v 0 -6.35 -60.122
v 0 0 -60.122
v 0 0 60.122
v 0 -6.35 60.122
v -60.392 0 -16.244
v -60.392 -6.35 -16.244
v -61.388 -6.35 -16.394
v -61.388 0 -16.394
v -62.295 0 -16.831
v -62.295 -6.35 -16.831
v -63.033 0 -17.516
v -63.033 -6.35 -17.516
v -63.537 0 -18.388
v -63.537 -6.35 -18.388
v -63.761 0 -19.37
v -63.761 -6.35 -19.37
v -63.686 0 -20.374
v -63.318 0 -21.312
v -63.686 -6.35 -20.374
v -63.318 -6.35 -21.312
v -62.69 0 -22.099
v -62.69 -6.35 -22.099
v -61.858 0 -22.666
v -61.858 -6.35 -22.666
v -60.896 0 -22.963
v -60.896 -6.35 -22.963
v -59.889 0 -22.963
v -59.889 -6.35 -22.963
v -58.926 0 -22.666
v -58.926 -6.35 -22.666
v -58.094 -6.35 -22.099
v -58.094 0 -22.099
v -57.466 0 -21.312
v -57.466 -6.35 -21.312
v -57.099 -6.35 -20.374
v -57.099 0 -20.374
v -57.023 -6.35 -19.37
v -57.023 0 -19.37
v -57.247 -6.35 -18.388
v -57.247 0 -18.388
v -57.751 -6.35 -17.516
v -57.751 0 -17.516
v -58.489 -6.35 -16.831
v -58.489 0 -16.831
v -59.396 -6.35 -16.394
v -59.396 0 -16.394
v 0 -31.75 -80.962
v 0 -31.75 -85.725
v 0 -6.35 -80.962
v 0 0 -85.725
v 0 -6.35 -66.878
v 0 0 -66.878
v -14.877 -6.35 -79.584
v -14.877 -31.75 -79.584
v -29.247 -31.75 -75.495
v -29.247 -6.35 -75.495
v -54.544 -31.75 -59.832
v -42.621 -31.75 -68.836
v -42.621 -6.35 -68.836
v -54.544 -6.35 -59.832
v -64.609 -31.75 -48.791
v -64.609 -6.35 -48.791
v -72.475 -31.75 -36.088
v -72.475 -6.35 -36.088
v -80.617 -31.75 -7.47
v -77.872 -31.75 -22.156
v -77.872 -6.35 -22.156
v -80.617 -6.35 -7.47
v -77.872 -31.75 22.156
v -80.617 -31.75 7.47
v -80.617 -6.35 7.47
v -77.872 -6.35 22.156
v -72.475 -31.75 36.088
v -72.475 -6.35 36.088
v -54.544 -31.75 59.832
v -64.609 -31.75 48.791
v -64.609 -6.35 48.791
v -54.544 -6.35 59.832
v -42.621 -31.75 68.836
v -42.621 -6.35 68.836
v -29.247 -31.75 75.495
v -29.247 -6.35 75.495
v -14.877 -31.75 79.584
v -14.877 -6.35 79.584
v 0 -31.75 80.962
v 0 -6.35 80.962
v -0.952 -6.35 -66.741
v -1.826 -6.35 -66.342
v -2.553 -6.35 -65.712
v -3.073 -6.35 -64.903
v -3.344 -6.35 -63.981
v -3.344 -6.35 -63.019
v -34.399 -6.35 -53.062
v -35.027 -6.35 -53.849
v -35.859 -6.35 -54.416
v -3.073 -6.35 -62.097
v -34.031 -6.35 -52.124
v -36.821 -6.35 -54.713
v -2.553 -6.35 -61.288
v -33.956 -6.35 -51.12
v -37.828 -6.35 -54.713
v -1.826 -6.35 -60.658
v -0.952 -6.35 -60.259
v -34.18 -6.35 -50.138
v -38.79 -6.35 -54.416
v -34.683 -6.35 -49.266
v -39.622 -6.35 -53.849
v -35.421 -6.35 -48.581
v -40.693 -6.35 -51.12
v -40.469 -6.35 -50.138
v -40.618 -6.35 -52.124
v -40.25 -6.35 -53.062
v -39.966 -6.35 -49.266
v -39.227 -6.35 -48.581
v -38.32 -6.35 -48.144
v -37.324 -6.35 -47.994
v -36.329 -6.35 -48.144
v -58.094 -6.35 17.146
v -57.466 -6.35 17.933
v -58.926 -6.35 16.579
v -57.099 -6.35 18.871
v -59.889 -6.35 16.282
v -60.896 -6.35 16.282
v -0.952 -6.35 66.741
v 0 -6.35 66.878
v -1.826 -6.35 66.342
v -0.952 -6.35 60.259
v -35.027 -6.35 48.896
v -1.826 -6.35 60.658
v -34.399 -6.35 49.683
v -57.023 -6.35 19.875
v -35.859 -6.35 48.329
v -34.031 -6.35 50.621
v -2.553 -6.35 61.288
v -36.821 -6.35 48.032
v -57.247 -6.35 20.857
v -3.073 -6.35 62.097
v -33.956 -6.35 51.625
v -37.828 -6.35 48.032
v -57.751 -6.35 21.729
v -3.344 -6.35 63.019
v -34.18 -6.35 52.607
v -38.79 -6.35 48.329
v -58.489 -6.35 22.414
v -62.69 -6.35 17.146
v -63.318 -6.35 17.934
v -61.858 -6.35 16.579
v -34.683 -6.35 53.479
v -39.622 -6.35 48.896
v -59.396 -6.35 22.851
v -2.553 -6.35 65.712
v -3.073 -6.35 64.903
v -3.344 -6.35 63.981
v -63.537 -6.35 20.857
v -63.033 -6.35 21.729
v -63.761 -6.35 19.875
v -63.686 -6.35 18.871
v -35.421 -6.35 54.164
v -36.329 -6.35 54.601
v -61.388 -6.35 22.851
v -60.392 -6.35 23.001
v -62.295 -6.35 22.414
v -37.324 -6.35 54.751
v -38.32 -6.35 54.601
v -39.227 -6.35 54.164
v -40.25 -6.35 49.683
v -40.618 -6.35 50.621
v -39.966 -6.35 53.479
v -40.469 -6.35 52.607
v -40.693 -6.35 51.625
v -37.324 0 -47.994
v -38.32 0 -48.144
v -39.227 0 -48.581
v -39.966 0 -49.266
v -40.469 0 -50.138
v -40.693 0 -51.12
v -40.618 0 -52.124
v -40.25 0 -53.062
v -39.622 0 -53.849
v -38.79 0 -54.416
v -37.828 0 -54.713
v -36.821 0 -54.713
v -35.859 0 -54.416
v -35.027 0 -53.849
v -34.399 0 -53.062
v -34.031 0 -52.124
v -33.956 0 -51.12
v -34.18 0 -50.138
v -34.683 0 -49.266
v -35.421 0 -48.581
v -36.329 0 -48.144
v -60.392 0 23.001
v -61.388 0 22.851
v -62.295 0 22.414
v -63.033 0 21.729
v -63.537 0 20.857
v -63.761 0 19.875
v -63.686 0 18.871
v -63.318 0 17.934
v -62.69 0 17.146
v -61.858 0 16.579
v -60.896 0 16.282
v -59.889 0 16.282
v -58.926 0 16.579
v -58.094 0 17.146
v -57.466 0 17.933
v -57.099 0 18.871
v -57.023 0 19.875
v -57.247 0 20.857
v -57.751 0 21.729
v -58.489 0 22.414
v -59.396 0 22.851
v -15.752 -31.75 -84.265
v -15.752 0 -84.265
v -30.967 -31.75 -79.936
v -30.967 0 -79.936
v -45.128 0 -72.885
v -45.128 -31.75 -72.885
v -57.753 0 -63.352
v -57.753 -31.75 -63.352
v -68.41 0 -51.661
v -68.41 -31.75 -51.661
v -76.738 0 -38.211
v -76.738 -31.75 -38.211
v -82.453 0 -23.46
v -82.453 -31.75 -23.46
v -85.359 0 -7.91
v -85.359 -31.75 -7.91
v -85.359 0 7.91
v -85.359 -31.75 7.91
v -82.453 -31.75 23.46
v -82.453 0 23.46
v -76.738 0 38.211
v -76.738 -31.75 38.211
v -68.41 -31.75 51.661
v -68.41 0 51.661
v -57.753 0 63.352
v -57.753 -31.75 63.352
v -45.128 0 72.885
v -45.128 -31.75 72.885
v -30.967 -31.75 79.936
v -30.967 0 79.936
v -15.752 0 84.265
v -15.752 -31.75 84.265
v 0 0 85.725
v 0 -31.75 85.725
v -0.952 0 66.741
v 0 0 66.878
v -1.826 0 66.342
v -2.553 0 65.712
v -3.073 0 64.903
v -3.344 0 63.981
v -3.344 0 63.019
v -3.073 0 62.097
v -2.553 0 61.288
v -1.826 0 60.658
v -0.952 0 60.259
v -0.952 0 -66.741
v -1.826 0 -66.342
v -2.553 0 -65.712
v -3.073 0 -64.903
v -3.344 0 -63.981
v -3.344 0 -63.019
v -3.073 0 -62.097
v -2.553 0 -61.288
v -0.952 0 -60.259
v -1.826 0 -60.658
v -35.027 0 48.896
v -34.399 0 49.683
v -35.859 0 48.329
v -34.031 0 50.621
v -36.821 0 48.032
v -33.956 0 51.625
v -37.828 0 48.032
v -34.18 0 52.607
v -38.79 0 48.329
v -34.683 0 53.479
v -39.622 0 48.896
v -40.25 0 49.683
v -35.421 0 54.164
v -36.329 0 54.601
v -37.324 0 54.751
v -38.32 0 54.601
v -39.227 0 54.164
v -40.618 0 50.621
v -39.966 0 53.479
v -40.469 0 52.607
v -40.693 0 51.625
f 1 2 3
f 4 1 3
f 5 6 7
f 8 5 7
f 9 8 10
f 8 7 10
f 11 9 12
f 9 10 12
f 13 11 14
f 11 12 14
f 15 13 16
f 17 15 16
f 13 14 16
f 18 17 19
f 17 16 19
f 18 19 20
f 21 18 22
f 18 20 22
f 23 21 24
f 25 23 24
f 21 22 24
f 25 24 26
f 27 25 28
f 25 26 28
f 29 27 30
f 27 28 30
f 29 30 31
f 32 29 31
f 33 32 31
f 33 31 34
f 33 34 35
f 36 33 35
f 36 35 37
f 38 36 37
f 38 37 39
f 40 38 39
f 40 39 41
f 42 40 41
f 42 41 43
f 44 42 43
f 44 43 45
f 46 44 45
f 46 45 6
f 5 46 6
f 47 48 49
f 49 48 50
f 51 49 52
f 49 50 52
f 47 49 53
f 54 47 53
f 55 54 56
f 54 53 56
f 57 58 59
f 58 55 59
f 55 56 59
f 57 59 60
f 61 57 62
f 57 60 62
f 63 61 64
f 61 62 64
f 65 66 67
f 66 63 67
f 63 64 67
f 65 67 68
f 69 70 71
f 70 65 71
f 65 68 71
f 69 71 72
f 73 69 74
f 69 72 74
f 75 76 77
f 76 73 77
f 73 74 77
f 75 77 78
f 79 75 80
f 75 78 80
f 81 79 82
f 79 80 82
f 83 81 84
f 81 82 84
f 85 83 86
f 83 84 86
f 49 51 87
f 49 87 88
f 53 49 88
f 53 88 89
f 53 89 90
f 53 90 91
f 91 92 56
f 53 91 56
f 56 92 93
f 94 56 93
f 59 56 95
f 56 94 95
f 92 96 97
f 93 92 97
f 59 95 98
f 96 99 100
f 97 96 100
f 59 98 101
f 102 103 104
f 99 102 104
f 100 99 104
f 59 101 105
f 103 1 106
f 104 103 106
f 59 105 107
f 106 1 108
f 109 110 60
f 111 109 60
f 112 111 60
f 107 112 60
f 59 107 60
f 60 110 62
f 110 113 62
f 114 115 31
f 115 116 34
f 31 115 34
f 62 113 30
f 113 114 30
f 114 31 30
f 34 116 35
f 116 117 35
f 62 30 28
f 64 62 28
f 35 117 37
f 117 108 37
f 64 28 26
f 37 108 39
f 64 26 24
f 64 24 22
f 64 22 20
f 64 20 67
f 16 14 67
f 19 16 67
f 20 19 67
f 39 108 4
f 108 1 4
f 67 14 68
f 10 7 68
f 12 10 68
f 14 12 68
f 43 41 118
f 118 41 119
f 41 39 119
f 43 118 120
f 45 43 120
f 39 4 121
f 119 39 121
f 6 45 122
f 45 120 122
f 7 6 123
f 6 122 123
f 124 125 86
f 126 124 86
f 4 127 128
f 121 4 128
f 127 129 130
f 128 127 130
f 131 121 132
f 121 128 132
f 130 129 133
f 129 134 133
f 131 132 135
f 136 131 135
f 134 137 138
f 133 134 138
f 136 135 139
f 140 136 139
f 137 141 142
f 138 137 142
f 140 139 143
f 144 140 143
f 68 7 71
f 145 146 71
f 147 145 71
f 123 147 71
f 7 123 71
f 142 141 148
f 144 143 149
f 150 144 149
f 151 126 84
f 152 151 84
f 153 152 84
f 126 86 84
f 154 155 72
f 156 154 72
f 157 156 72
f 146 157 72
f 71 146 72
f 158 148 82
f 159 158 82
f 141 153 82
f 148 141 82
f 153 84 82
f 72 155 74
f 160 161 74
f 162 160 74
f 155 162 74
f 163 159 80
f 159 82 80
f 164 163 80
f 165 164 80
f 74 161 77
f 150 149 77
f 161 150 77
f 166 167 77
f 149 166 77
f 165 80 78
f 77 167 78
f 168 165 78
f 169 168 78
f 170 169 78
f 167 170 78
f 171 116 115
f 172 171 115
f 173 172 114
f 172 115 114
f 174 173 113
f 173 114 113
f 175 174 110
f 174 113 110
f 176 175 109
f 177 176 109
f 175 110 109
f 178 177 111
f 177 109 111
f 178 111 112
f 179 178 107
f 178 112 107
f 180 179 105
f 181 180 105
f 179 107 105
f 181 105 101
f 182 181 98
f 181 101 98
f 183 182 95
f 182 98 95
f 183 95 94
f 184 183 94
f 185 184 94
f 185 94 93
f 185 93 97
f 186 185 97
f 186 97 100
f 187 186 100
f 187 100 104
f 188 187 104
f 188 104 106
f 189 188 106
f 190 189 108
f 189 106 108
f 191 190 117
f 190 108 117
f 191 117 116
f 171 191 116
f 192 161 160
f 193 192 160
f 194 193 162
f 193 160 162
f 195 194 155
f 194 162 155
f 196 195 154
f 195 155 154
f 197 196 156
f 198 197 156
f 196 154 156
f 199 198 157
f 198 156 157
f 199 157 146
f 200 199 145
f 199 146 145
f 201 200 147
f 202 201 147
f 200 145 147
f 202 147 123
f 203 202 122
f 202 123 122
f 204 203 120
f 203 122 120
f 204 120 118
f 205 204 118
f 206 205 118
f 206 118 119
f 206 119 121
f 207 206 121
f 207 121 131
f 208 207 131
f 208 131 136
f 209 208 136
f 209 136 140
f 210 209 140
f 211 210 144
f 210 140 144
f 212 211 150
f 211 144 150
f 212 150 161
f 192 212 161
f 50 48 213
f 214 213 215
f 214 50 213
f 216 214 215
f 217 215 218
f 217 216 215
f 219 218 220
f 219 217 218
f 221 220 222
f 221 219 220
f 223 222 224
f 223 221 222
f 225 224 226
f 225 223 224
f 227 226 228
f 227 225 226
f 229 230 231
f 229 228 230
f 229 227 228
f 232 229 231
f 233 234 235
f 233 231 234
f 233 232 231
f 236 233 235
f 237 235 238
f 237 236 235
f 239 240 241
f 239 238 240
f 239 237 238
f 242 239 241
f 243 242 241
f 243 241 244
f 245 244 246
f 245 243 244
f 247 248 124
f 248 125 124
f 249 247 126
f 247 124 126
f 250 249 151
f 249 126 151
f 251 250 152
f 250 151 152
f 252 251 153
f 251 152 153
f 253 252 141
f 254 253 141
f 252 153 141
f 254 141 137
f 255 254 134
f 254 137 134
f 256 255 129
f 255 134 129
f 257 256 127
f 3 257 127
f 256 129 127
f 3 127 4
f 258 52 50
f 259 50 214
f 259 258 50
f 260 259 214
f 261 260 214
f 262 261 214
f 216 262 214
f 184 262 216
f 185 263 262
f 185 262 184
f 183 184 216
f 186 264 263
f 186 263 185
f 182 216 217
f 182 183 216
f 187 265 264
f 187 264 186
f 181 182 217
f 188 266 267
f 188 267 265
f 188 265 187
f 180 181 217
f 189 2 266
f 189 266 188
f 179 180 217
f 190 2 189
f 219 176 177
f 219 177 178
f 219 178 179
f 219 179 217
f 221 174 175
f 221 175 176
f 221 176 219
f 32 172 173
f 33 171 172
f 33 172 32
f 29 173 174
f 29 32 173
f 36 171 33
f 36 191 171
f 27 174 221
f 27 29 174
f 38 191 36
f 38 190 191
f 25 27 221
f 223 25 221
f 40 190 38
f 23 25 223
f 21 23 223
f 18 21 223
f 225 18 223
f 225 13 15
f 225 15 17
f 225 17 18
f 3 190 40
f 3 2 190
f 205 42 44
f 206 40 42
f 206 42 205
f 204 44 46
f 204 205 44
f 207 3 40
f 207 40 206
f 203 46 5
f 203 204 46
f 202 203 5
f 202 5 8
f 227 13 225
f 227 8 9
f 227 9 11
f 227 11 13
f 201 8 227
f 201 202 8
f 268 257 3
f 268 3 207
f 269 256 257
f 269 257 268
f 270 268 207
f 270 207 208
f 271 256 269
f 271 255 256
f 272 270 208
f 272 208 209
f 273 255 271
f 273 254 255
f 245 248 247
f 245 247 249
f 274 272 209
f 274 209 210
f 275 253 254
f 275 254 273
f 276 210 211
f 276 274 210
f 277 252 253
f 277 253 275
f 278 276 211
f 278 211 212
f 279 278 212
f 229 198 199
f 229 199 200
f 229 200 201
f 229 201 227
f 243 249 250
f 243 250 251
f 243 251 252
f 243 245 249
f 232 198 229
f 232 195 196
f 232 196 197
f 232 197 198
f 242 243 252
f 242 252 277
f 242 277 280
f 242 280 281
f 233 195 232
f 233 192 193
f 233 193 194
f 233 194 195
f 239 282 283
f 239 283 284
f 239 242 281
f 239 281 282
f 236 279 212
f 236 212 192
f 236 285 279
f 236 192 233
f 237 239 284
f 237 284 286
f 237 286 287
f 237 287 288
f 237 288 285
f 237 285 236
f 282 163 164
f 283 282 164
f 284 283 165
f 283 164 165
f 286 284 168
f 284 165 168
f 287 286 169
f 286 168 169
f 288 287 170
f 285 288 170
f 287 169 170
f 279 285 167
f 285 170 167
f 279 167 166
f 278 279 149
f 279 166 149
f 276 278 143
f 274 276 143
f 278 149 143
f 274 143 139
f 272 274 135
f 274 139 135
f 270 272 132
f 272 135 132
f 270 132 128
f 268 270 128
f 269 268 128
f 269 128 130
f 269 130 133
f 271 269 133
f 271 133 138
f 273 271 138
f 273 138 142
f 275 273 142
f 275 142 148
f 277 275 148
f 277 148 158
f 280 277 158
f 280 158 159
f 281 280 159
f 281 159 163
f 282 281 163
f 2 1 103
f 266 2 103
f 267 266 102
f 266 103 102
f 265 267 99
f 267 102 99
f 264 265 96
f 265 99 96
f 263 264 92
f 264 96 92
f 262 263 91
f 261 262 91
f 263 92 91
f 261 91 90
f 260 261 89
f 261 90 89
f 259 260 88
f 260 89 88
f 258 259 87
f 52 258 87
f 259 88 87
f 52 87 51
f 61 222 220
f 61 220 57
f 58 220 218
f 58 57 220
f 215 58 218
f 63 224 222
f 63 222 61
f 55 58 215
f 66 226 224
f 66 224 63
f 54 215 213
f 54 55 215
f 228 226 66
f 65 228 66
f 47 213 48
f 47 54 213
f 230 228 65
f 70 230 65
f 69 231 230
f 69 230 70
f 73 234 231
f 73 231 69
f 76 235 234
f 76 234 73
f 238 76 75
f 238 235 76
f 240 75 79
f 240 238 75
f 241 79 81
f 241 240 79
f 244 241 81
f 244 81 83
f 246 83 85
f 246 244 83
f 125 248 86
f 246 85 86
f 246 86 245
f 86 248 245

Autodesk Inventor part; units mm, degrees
ref_plane "YZ Plane" through (0, 0, 0) normal (1, 0, 0) x (0, 1, 0)
ref_plane "XZ Plane" through (0, 0, 0) normal (0, 1, 0) x (-1, 0, 0)
ref_plane "XY Plane" through (0, 0, 0) normal (0, 0, 1) x (1, 0, 0)
sketch "Sketch1" plane through (0, 0, 0) normal (0, 1, 0) x (-1, 0, 0)
  circle A0 centre (0, 0) radius 85.725
  dimension "d0" = 171.45
extrude "Extrusion1" add sketch "Sketch1" against normal blind 6.35
sketch "Sketch2" plane through (0, -6.35, 0) normal (0, -1, 0) x (1, 0, 0)
  circle A0 centre (0, 0) radius 85.725
  circle A1 centre (0, 0) radius 80.9625
  dimension "d3" = 161.925
extrude "Extrusion2" add sketch "Sketch2" along normal blind 25.4
sketch "Sketch3" plane through (0, 0, 0) normal (0, 1, 0) x (1, 0, 0)
  arc A0 (0, -85.725) -> (0, 85.725) centre (0, 0) ccw
  circle A1 centre (0, 0) radius 85.725 projected
  line L0 (0, 85.725) -> (0, -85.725)
extrude "Extrusion3" cut sketch "Sketch3" against normal through all contours L0 A0
sketch "Sketch4" plane through (0, 0, 0) normal (0, 1, 0) x (1, 0, 0)
  circle A0 centre (0, 0) radius 63.5 construction
  line L0 (0, 0) -> (-37.3244, -51.3726) construction
  line L1 (0, -85.725) -> (0, 85.725) construction
  point P0 (-60.3921, -19.6226)
  point P1 (-60.3921, 19.6226)
  point P2 (-37.3244, 51.3726)
  point P3 (0, 63.5)
  point P4 (37.3244, 51.3726)
  point P5 (60.3921, 19.6226)
  point P6 (60.3921, -19.6226)
  point P7 (37.3244, -51.3726)
  point P8 (0, -63.5)
  dimension "d8" = 127
  dimension "d9" = 36
  dimension "d12" = 360
hole "Hole1" at (-37.3244, 0, 51.3726) at (-60.3921, 0, 19.6226) at (-60.3921, 0, -19.6226) at (-37.3244, 0, -51.3726) at (0, 0, -63.5) at (37.3244, 0, -51.3726) at (60.3921, 0, -19.6226) at (60.3921, 0, 19.6226) at (37.3244, 0, 51.3726) at (0, 0, 63.5) direction (0, -1, 0) diameter 6.7564 end through all clearance for "Flat Head Machine Screw (82)" size "1/4" standard "Ansi Unified Screw Threads"
properties part number "CoverPlateForWaterHalf" material "PET Plastic"
